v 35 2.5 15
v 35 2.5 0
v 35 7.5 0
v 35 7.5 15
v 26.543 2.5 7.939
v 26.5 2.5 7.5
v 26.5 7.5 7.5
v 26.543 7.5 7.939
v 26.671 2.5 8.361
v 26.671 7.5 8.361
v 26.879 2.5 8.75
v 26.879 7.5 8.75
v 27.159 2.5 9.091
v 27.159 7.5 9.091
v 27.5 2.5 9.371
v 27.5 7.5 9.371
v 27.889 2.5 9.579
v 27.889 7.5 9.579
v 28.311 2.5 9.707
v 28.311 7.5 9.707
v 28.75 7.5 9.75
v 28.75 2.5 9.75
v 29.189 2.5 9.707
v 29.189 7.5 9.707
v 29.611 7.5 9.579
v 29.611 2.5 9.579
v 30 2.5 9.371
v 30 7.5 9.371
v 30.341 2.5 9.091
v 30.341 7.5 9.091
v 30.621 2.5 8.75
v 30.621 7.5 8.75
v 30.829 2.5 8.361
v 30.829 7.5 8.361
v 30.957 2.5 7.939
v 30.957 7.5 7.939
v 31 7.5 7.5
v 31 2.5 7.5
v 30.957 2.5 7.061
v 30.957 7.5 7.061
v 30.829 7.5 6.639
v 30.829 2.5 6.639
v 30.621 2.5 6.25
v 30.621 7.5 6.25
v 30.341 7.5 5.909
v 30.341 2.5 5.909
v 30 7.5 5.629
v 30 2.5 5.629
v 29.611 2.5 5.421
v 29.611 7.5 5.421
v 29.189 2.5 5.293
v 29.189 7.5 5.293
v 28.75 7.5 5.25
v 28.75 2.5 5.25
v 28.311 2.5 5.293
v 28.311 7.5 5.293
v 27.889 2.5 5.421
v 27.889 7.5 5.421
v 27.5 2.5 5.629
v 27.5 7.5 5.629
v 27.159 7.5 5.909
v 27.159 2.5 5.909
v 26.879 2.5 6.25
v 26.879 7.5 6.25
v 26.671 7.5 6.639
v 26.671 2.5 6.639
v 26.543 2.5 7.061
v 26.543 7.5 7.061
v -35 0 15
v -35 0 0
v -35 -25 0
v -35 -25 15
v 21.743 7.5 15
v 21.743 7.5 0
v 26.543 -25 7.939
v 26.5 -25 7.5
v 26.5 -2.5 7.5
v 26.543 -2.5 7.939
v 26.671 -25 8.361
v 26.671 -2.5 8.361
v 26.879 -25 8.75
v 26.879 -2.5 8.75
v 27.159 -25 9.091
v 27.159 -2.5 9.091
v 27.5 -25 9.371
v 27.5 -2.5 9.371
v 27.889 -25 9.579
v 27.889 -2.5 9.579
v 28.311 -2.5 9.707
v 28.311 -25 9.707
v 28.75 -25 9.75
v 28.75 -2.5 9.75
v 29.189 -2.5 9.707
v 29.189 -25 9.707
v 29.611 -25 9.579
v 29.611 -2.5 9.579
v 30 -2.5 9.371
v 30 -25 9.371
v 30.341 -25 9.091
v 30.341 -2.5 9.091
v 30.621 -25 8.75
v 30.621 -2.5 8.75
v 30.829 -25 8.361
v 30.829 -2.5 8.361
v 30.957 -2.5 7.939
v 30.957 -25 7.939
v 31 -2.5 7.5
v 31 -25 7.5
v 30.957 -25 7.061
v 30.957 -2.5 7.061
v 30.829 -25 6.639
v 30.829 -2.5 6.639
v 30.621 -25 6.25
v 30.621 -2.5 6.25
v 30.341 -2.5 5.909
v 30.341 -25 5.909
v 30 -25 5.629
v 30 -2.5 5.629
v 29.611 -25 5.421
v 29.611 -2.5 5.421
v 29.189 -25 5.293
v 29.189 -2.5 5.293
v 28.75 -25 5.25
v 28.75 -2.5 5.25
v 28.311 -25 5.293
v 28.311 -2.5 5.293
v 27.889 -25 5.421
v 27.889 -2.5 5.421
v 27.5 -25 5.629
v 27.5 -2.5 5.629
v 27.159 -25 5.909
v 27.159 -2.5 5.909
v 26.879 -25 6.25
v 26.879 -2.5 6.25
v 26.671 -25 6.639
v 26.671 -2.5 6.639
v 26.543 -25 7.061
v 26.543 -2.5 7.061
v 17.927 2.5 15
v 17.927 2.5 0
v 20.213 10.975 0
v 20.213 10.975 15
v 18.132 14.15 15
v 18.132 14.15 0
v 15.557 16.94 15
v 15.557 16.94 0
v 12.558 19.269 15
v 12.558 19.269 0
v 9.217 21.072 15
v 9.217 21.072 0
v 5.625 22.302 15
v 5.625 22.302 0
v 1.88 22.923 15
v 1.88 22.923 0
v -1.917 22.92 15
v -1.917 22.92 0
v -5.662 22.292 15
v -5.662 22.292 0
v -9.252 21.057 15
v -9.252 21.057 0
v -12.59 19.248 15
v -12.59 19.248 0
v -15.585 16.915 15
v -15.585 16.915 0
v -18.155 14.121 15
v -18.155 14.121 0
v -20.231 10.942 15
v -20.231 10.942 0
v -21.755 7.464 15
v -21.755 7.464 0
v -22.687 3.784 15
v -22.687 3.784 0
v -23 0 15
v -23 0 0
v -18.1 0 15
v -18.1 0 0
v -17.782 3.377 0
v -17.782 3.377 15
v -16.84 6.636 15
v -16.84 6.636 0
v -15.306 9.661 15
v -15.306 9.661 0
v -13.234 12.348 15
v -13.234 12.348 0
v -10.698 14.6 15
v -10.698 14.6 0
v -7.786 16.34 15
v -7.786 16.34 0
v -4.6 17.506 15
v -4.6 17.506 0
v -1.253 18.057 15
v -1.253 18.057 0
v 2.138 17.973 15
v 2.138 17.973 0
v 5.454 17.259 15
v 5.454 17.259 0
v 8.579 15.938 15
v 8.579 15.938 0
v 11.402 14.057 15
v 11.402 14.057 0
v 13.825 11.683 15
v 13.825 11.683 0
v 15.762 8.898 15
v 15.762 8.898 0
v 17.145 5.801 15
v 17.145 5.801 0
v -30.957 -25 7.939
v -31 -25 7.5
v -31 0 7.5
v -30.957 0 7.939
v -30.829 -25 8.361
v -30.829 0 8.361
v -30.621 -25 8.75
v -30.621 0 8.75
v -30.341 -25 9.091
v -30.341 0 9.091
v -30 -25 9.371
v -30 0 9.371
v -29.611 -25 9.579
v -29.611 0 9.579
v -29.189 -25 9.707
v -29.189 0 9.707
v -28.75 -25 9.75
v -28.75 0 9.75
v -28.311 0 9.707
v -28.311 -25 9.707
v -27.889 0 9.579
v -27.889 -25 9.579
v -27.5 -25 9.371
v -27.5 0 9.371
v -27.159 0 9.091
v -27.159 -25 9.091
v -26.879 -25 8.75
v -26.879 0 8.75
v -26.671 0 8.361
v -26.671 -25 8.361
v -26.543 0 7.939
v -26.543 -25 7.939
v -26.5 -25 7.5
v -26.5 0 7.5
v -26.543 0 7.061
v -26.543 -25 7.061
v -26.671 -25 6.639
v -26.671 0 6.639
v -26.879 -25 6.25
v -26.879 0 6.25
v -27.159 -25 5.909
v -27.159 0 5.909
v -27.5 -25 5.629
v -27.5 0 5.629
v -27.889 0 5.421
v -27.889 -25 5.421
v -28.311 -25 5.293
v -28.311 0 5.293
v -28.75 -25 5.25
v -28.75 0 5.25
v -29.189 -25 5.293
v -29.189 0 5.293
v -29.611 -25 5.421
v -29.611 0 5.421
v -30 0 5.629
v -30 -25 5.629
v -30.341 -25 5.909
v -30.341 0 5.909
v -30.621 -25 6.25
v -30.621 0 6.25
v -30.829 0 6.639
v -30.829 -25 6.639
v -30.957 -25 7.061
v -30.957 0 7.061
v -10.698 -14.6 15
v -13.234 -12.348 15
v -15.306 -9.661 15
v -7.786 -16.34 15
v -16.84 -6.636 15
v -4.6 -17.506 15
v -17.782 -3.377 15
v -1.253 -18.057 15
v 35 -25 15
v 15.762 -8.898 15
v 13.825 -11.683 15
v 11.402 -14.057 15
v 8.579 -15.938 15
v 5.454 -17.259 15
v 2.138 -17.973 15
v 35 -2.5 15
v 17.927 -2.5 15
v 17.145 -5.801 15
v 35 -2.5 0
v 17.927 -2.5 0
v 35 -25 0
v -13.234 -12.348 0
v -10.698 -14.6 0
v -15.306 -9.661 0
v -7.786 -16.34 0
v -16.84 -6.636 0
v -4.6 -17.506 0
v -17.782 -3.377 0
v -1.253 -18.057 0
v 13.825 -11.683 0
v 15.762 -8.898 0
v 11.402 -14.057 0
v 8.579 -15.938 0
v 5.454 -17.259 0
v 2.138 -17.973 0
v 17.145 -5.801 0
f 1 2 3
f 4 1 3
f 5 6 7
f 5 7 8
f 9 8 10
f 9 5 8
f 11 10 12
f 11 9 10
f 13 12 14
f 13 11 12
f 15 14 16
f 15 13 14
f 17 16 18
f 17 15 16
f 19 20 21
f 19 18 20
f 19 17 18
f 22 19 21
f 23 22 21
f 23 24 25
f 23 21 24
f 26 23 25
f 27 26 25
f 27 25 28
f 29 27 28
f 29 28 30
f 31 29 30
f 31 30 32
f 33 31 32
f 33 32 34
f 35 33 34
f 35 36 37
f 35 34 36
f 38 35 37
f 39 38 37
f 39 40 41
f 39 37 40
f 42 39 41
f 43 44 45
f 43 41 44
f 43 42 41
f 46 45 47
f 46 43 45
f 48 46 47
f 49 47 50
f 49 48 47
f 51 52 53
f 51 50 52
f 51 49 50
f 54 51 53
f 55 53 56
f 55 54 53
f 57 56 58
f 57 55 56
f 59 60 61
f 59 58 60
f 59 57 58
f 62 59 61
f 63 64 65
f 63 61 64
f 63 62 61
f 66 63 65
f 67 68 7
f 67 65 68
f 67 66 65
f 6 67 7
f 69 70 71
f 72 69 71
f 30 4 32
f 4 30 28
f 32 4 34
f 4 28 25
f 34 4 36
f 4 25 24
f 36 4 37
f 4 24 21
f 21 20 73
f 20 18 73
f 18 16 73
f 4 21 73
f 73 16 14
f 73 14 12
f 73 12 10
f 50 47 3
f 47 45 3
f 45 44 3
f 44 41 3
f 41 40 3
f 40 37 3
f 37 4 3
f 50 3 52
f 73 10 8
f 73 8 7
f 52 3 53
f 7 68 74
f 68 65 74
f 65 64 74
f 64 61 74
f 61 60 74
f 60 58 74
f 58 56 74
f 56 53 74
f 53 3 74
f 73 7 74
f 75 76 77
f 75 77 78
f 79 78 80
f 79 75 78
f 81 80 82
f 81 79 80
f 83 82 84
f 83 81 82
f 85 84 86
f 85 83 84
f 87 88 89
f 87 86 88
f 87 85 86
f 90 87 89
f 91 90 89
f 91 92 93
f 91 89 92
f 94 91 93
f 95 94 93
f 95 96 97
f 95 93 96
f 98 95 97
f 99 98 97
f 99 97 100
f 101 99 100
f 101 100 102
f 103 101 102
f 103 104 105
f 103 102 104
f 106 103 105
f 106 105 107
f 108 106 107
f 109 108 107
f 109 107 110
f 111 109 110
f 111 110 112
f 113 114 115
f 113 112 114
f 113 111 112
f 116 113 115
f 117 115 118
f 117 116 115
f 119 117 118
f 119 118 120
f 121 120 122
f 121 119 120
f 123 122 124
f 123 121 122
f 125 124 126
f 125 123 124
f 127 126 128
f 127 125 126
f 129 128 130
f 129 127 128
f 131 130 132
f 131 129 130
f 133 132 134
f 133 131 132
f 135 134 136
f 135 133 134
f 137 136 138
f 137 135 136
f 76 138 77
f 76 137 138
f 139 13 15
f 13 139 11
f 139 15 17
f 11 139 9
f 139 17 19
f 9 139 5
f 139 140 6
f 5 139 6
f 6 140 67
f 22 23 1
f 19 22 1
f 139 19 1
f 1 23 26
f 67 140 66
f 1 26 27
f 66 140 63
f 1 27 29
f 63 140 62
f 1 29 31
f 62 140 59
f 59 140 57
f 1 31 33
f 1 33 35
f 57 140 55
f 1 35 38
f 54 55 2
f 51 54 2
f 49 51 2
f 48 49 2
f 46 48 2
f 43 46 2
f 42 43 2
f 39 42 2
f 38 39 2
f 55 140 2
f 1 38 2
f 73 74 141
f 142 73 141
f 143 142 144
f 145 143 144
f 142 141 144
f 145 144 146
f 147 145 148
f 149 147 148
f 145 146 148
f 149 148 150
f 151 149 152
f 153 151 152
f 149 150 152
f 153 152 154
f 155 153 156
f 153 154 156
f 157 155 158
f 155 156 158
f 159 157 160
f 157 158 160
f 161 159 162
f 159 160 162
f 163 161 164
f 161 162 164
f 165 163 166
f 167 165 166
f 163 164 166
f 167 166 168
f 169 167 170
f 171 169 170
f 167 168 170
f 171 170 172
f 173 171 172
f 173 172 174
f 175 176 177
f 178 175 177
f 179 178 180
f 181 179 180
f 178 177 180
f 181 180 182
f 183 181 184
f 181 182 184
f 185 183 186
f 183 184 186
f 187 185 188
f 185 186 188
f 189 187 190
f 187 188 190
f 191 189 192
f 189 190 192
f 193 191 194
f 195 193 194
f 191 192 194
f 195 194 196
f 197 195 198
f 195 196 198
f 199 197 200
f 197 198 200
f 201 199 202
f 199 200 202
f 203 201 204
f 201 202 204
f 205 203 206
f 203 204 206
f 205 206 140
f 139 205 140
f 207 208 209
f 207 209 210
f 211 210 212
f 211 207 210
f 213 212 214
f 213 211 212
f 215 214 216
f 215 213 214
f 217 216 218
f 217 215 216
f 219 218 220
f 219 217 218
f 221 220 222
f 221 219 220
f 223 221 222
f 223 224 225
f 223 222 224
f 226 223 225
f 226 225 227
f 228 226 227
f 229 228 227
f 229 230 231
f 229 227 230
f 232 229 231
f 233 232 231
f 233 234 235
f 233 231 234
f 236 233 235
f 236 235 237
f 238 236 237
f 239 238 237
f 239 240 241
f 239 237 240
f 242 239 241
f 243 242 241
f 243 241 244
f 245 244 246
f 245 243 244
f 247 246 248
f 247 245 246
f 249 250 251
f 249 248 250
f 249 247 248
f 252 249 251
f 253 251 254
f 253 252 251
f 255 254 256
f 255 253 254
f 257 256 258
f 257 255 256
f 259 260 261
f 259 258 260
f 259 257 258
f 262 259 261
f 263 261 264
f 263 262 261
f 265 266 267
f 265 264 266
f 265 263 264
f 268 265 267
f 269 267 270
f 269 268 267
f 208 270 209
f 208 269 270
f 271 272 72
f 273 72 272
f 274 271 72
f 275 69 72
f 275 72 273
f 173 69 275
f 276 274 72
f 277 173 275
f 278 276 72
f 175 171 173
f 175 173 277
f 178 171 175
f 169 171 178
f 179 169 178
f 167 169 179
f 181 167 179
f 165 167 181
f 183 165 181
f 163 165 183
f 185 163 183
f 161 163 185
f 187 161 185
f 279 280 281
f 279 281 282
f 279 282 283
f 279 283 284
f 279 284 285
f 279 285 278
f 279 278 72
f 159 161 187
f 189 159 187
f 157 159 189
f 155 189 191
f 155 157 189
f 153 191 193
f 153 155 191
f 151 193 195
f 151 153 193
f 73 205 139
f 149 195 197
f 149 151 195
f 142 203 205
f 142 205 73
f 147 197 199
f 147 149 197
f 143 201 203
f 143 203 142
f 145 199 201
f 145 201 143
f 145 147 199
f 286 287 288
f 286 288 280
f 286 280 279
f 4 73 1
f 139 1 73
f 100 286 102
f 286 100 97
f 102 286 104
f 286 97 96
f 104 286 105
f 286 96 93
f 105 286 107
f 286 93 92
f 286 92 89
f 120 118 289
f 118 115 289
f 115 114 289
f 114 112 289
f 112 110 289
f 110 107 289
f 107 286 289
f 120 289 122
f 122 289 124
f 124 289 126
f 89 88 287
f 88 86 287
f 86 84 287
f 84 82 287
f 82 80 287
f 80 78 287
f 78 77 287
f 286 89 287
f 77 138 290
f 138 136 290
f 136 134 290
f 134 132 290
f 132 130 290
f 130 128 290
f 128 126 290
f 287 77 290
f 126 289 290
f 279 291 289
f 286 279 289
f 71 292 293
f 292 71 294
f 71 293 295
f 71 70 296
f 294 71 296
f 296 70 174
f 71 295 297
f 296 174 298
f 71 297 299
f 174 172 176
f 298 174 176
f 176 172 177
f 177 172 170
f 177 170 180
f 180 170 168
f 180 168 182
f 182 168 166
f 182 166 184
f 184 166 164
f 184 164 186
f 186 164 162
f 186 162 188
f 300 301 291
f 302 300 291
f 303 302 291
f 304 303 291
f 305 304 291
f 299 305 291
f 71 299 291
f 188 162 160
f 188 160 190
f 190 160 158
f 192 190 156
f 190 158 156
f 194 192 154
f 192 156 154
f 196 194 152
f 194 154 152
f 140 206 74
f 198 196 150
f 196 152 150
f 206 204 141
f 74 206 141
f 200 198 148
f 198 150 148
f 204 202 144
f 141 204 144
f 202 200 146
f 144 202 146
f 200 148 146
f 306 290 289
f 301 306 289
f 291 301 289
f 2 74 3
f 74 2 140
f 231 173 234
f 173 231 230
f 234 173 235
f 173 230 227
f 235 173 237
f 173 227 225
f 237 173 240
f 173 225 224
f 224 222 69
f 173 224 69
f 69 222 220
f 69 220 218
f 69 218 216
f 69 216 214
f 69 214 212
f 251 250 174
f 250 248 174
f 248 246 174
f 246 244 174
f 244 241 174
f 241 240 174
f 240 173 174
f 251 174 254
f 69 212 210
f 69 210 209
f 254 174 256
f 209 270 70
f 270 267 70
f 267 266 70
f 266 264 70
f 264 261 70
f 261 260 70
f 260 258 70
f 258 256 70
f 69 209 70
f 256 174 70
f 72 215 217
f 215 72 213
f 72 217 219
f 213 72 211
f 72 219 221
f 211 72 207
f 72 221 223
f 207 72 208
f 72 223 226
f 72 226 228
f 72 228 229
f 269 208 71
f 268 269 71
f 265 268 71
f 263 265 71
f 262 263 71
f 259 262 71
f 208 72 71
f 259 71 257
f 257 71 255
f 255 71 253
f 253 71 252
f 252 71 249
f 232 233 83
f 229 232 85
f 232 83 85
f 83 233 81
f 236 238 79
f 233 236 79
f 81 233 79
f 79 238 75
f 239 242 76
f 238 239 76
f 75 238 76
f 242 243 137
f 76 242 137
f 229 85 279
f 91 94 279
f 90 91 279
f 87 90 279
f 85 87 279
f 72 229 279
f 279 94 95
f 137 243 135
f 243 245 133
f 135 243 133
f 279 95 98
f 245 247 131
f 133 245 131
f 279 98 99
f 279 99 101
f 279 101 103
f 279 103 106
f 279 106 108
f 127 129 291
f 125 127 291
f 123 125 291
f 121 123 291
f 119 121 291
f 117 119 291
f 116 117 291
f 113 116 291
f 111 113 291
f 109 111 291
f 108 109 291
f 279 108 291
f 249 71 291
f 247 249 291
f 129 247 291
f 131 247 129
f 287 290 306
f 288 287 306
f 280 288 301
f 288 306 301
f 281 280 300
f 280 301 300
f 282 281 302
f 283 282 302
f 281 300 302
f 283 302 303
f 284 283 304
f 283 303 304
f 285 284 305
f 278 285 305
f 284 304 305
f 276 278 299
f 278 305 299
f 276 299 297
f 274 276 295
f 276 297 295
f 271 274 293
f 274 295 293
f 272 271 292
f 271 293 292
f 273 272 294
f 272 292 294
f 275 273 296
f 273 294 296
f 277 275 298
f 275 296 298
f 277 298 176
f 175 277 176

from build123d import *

# Parameters (mm, degrees)
BOSS_EXTRUDE2_DEPTH     = 15
CUT_EXTRUDE3_DEPTH      = 46.552167896
CUT_EXTRUDE3_DEPTH_BACK = 46.552167896
SKETCH4_R               = 2.25


with BuildPart() as part:
    # Sketch1 → Boss-Extrude2 (new body)
    with BuildSketch(Plane.XY):
        with BuildLine():
            ThreePointArc((17.926516672, -2.5), (-1.253006032, -18.056577081), (-18.1, 0))
            Line((-18.1, 0), (-23, 0))
            Line((-23, 0), (-35, 0))
            Line((-35, 0), (-35, -22.5))
            Line((-35, -22.5), (-35, -25))
            Line((-35, -25), (35, -25))
            Line((35, -25), (35, -22.5))
            Line((35, -22.5), (35, -7.5))
            Line((35, -7.5), (35, -2.5))
            Line((35, -2.5), (17.926516672, -2.5))
        make_face()
        with BuildLine():
            Line((17.926516672, 2.5), (35, 2.5))
            Line((35, 2.5), (35, 7.5))
            Line((35, 7.5), (21.742814905, 7.5))
            ThreePointArc((21.742814905, 7.5), (-3.802318844, 22.683526432), (-23, 0))
            Line((-23, 0), (-18.1, 0))
            ThreePointArc((-18.1, 0), (-1.253006032, 18.056577081), (17.926516672, 2.5))
        make_face()
    extrude(amount=BOSS_EXTRUDE2_DEPTH)

    # Sketch4 → Cut-Extrude3 (cut, two sides: drawn at the far end of the back side and taken through both)
    with BuildSketch(Plane(origin=(0, 0, 0), x_dir=(1, 0, 0), z_dir=(0, 1, 0)).offset(-CUT_EXTRUDE3_DEPTH_BACK)):
        with Locations(Location((-28.75, -7.5, 0), (0, 0, 180))):
            Circle(SKETCH4_R)
        with Locations(Location((28.75, -7.5, 0), (0, 0, 180))):
            Circle(SKETCH4_R)
    extrude(amount=CUT_EXTRUDE3_DEPTH + CUT_EXTRUDE3_DEPTH_BACK, mode=Mode.SUBTRACT)


solid = part.part
